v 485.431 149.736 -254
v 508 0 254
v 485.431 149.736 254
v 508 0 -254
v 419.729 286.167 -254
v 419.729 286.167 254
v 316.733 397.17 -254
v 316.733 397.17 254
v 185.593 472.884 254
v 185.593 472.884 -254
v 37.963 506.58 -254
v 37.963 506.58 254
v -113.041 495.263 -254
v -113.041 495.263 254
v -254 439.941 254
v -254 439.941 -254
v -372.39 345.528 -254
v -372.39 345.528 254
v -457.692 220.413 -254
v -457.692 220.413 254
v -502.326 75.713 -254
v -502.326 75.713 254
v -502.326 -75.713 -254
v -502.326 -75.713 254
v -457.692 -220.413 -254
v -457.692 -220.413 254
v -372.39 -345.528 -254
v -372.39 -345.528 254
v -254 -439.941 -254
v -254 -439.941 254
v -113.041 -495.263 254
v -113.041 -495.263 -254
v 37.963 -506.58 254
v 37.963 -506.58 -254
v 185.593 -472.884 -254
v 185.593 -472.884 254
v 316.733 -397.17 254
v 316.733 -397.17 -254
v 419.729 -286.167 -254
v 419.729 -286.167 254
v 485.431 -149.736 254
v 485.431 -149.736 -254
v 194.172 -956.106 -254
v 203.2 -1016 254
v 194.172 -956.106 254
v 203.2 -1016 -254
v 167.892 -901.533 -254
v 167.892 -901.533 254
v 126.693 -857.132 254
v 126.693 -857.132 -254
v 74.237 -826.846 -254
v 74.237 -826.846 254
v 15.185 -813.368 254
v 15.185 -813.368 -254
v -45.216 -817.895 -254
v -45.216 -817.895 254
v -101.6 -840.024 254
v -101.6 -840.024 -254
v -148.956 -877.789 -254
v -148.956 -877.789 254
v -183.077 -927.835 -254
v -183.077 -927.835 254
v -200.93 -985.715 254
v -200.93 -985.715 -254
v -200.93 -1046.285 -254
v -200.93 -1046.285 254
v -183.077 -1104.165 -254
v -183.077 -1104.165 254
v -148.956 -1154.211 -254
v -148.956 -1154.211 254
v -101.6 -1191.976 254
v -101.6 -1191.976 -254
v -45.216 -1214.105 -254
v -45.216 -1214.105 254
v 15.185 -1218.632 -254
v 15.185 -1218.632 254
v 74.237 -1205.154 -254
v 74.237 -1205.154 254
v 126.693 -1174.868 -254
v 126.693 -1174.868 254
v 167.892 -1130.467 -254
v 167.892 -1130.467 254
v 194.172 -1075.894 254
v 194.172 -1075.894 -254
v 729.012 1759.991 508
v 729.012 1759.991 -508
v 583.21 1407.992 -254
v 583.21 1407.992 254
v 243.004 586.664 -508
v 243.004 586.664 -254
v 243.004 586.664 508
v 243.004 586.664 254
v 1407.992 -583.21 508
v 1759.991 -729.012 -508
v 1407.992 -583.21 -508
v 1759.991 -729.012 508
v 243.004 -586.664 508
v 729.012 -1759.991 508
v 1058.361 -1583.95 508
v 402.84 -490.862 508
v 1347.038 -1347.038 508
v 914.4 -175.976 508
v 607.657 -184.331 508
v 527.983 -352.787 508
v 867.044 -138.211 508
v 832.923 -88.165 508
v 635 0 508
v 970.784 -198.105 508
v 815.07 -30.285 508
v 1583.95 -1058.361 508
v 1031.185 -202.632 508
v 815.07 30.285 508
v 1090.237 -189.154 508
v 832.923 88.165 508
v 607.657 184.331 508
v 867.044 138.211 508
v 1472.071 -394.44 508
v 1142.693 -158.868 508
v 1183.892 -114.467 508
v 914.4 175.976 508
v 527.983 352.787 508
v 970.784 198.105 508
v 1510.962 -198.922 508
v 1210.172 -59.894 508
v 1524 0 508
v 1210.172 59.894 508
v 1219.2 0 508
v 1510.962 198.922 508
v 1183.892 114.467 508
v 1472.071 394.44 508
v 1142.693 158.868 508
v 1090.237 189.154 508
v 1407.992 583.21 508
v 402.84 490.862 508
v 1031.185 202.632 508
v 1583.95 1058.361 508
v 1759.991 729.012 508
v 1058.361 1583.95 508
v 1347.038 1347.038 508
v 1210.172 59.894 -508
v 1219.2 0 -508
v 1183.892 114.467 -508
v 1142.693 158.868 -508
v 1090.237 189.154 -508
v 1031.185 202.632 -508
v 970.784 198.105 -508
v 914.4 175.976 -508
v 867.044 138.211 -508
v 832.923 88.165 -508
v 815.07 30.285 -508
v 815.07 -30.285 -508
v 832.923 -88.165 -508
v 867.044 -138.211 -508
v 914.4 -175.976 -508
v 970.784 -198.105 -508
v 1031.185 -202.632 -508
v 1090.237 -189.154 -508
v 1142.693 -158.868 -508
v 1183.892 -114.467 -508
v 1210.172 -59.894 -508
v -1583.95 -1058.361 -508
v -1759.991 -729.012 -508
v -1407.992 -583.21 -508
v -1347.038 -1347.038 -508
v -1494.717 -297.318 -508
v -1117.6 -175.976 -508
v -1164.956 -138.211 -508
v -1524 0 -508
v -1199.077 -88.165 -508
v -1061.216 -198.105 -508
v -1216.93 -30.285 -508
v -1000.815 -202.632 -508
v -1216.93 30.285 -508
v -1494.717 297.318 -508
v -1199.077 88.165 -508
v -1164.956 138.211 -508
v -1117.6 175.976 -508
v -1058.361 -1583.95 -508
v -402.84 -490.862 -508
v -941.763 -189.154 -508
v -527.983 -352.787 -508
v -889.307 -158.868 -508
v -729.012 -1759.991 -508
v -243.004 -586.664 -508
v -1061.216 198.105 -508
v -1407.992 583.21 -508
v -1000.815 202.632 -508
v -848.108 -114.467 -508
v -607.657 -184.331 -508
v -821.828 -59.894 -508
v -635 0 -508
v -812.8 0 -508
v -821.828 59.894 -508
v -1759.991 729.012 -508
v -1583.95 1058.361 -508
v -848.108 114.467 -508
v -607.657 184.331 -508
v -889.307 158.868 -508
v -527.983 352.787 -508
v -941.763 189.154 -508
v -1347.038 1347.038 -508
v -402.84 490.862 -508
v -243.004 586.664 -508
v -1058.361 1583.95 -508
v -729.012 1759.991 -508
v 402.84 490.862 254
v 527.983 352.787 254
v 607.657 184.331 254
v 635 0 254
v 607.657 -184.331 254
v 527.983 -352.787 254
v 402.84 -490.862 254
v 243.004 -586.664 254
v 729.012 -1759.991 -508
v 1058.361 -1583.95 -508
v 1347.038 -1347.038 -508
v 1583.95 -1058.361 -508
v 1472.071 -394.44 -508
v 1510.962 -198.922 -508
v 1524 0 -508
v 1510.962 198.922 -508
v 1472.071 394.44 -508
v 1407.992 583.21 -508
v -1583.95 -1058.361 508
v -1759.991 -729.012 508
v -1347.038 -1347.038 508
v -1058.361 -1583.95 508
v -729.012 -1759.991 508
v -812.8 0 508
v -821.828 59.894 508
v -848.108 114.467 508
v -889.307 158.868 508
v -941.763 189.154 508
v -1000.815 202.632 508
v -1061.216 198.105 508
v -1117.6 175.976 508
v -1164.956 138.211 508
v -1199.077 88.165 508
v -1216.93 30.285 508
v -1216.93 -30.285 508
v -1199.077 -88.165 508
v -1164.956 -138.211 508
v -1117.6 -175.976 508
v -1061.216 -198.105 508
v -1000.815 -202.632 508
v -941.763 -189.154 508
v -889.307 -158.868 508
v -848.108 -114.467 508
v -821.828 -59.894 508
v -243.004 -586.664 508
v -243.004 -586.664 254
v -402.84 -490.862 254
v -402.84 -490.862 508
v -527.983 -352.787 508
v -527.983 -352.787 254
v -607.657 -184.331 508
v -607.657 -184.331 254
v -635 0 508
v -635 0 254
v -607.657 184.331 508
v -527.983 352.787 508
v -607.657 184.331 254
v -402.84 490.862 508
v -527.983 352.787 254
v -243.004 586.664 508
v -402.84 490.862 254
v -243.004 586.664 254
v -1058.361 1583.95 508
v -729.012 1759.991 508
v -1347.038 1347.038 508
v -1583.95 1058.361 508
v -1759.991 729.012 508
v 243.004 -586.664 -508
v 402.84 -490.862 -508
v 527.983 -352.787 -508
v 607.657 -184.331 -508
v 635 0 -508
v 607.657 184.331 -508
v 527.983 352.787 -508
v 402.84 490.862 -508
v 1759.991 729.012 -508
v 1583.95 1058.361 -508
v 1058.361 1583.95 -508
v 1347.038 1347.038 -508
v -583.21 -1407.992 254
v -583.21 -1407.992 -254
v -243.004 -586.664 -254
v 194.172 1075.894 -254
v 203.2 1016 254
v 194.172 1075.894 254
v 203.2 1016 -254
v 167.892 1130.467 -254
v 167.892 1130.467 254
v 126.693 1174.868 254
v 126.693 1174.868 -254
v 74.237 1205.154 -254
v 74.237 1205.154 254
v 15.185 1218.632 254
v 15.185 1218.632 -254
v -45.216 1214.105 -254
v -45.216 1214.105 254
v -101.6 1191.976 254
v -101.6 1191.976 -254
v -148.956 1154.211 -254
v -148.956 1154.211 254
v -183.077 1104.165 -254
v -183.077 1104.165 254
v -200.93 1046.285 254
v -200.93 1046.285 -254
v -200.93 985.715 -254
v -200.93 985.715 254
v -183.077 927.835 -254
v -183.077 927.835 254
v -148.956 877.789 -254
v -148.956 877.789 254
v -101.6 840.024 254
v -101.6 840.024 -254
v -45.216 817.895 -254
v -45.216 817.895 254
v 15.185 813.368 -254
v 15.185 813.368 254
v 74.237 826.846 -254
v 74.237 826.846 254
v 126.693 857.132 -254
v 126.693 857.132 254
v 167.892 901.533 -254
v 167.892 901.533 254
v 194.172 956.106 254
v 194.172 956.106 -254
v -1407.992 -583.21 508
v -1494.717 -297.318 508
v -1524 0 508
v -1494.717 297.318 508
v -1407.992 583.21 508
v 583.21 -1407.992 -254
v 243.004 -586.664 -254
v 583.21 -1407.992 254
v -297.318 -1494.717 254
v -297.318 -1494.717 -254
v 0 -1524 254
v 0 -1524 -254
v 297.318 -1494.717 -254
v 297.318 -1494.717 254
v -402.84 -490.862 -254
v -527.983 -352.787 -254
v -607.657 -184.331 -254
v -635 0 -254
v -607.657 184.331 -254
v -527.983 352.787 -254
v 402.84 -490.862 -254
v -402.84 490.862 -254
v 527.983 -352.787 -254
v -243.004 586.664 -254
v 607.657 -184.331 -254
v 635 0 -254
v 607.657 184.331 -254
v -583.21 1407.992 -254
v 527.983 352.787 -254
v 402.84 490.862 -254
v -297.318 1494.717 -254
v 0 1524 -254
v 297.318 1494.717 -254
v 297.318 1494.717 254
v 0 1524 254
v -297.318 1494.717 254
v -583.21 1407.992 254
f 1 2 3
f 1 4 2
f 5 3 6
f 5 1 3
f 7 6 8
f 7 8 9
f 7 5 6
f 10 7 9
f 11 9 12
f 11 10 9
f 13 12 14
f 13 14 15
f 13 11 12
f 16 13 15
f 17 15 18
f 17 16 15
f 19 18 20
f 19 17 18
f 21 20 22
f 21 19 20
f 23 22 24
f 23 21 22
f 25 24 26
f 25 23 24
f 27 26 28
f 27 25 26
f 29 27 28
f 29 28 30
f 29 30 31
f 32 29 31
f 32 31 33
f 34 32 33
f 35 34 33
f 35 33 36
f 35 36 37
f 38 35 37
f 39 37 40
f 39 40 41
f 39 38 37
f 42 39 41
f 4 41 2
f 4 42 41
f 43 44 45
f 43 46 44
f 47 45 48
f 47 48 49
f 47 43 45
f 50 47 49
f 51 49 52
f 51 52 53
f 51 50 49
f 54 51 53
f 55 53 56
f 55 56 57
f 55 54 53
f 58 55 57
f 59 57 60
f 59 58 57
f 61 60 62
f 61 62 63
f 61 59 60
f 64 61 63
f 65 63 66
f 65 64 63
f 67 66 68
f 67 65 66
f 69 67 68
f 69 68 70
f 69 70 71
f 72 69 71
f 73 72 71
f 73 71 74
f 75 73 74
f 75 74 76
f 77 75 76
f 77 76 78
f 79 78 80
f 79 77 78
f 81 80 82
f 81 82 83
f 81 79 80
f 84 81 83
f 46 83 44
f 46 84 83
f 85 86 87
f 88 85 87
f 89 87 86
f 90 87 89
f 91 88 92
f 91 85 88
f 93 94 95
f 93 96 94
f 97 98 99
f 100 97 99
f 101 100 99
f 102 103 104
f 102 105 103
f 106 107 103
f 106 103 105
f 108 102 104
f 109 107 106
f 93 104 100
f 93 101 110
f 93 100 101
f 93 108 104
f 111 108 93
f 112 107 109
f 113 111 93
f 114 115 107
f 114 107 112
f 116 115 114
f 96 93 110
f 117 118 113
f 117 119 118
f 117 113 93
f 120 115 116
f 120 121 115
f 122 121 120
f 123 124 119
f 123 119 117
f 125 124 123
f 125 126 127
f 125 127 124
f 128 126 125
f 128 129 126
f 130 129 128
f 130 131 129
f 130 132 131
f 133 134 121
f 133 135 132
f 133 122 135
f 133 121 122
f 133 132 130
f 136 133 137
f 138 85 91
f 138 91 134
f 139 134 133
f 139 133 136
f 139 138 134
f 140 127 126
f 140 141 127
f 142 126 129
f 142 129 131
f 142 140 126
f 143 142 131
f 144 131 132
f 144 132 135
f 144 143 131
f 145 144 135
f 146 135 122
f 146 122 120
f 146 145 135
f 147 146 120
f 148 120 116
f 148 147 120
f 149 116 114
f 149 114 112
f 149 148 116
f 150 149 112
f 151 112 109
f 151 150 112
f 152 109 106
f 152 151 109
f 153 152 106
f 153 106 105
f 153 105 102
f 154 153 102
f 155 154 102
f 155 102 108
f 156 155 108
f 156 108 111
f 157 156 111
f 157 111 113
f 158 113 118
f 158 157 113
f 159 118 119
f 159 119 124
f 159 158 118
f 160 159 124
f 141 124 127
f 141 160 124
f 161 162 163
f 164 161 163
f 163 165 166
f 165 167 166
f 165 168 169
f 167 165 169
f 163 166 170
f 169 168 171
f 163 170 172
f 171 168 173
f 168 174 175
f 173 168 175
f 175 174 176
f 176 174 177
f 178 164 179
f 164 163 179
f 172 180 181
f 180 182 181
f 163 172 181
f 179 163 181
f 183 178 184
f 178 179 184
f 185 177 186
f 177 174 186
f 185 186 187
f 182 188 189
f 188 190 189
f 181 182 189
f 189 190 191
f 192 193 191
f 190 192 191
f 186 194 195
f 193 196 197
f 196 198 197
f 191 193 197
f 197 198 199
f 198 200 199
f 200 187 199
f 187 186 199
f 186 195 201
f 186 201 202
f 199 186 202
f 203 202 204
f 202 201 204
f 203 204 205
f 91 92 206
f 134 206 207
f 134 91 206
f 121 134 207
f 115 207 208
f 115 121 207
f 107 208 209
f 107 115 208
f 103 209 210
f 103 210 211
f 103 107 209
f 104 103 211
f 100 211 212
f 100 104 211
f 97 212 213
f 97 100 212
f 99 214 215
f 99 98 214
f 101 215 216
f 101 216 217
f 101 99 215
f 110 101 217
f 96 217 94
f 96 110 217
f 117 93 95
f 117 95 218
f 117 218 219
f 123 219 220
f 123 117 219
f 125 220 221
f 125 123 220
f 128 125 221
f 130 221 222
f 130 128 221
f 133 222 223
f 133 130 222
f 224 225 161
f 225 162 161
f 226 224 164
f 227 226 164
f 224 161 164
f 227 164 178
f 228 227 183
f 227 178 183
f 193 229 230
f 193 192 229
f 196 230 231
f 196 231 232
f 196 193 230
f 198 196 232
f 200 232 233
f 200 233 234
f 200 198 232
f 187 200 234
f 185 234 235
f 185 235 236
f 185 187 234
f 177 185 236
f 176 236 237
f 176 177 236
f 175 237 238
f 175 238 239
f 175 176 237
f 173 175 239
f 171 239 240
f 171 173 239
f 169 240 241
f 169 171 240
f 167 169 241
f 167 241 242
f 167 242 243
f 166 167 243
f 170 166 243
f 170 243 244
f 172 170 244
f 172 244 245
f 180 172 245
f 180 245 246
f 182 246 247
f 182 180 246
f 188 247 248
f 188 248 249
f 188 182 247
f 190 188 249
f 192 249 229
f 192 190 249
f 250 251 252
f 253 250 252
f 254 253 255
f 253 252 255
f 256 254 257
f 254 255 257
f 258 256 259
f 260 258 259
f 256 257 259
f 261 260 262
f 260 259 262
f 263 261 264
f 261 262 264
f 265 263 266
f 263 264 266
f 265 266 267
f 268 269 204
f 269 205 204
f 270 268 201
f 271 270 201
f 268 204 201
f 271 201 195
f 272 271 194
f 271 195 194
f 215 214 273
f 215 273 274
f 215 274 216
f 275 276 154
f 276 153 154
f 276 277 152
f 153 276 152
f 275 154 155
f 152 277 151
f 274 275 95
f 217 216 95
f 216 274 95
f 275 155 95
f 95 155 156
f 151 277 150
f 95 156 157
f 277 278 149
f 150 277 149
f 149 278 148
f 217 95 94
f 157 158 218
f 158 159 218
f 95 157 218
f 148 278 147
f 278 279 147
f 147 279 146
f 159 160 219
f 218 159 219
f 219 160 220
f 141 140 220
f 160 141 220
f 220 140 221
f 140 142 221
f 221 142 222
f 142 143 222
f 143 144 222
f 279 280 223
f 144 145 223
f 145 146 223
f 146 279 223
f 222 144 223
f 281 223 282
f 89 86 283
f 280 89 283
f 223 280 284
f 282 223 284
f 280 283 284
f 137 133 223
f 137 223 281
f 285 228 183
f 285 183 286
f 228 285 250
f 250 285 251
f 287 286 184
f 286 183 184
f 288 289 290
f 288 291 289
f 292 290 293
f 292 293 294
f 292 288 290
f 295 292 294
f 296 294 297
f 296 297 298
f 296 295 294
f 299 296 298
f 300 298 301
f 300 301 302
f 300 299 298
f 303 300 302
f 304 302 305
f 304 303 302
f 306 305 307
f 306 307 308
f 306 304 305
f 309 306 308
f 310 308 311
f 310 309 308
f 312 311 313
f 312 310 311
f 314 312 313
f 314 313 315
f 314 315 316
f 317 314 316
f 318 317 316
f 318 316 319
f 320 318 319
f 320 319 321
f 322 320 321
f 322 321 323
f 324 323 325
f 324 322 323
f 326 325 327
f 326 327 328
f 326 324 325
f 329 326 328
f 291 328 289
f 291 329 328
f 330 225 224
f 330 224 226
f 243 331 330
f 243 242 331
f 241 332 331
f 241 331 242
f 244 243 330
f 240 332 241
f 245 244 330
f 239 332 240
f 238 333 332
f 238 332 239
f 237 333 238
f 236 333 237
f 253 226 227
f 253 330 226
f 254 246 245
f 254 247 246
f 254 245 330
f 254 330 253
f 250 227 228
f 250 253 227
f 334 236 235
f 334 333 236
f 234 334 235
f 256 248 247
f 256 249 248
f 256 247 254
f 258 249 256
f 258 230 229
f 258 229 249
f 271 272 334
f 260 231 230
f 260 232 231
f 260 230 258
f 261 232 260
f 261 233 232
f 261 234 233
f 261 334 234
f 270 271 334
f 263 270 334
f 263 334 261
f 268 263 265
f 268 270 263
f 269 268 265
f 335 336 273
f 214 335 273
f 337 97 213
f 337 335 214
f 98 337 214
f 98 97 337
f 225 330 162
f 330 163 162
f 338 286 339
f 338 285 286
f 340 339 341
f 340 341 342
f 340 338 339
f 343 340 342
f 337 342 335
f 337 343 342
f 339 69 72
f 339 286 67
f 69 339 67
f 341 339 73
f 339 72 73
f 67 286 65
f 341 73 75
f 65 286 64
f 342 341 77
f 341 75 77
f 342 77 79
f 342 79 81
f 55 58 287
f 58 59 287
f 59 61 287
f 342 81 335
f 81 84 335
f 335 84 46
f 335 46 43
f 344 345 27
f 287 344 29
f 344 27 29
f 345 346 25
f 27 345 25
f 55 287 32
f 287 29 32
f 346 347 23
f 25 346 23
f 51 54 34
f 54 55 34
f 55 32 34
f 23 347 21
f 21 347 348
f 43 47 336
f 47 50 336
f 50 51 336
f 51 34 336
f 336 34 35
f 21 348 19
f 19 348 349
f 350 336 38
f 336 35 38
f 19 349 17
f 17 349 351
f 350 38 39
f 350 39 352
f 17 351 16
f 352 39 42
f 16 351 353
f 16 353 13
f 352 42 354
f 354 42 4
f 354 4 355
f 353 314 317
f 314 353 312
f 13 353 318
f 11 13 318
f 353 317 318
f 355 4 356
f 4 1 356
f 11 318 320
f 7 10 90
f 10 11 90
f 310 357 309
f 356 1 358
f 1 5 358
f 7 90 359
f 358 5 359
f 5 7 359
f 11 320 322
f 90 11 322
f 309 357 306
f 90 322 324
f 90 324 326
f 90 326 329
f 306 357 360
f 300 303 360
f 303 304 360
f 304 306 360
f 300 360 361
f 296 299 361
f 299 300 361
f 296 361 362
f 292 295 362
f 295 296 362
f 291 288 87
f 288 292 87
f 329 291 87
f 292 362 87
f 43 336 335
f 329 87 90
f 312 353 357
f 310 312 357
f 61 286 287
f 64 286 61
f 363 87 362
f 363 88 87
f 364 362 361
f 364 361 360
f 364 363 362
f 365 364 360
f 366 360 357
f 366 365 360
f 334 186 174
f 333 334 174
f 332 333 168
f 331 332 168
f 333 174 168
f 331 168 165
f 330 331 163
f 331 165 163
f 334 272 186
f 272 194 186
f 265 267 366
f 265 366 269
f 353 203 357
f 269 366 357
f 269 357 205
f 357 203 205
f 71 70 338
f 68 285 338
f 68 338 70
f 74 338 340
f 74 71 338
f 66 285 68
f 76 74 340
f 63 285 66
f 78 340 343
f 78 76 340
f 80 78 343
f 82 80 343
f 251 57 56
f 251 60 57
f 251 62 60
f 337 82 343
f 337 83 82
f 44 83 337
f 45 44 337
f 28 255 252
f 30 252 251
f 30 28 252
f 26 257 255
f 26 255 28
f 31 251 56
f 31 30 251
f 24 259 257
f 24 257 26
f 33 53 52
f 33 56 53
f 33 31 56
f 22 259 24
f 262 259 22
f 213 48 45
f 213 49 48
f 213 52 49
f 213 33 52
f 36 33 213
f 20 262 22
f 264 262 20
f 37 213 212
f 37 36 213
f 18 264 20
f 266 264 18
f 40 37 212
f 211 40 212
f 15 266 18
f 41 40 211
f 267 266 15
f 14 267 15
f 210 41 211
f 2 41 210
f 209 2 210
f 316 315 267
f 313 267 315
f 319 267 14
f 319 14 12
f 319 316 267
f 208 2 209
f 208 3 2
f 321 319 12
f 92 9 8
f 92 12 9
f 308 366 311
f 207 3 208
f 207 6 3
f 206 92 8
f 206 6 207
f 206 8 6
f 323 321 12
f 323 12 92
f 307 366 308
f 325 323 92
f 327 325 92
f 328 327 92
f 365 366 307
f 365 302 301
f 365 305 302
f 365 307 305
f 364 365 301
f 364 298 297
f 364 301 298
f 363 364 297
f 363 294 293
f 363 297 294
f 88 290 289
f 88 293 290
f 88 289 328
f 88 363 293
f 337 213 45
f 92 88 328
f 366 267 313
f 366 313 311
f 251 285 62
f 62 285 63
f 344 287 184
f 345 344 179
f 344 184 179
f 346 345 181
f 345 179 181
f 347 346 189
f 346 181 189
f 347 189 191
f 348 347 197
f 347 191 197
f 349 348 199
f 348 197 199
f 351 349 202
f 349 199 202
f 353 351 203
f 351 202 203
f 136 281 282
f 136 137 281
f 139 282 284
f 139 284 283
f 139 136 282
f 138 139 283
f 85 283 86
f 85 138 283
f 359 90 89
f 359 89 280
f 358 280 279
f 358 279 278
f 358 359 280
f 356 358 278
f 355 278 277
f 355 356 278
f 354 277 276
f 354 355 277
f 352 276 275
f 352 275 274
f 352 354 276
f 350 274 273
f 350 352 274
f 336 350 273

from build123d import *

# Parameters (mm, degrees)
SKETCH1_R             = 203.2
BOSS_EXTRUDE1_DEPTH   = 508
BOSS_EXTRUDE1_2_DEPTH = 508
SKETCH1_3_R           = 203.2
SKETCH1_3_R_2         = 508
BOSS_EXTRUDE2_DEPTH   = 254


with BuildPart() as part:
    # Sketch1 → Boss-Extrude1 (new, symmetric)
    with BuildSketch(Plane.XY):
        with BuildLine():
            Line((729.011938655, 1759.990509434), (243.003979552, 586.663503145))
            ThreePointArc((243.003979552, 586.663503145), (635, 0), (243.003979552, -586.663503145))
            Line((243.003979552, -586.663503145), (729.011938655, -1759.990509434))
            ThreePointArc((729.011938655, -1759.990509434), (1347.03841816, -1347.03841816), (1759.990509434, -729.011938655))
            Line((1759.990509434, -729.011938655), (1407.992407547, -583.209550924))
            ThreePointArc((1407.992407547, -583.209550924), (1524, 0), (1407.992407547, 583.209550924))
            Line((1407.992407547, 583.209550924), (1759.990509434, 729.011938655))
            ThreePointArc((1759.990509434, 729.011938655), (1347.03841816, 1347.03841816), (729.011938655, 1759.990509434))
        make_face()
        with Locations((1016, 0)):
            Circle(SKETCH1_R, mode=Mode.SUBTRACT)
    extrude(amount=BOSS_EXTRUDE1_DEPTH, both=True)



with BuildPart() as body_2:
    # Sketch1 → Boss-Extrude1 2 (new, symmetric)
    with BuildSketch(Plane.XY):
        with BuildLine():
            Line((-1759.990509434, 729.011938655), (-1407.992407547, 583.209550924))
            ThreePointArc((-1407.992407547, 583.209550924), (-1524, 0), (-1407.992407547, -583.209550924))
            Line((-1407.992407547, -583.209550924), (-1759.990509434, -729.011938655))
            ThreePointArc((-1759.990509434, -729.011938655), (-1347.03841816, -1347.03841816), (-729.011938655, -1759.990509434))
            Line((-729.011938655, -1759.990509434), (-243.003979552, -586.663503145))
            ThreePointArc((-243.003979552, -586.663503145), (-635, 0), (-243.003979552, 586.663503145))
            Line((-243.003979552, 586.663503145), (-729.011938655, 1759.990509434))
            ThreePointArc((-729.011938655, 1759.990509434), (-1347.03841816, 1347.03841816), (-1759.990509434, 729.011938655))
        make_face()
        with Locations((-1016, 0)):
            Circle(SKETCH1_R, mode=Mode.SUBTRACT)
    extrude(amount=BOSS_EXTRUDE1_2_DEPTH, both=True)


with BuildPart() as part_1:
    add(part.part)

    add(body_2.part)  # Boss-Extrude2 merges body 2
    # Sketch1<3> → Boss-Extrude2 (add, symmetric)
    with BuildSketch(Plane.XY):
        with BuildLine():
            Line((243.003979552, 586.663503145), (583.209550924, 1407.992407547))
            ThreePointArc((583.209550924, 1407.992407547), (0, 1524), (-583.209550924, 1407.992407547))
            Line((-583.209550924, 1407.992407547), (-243.003979552, 586.663503145))
            ThreePointArc((-243.003979552, 586.663503145), (-635, 0), (-243.003979552, -586.663503145))
            Line((-243.003979552, -586.663503145), (-583.209550924, -1407.992407547))
            ThreePointArc((-583.209550924, -1407.992407547), (0, -1524), (583.209550924, -1407.992407547))
            Line((583.209550924, -1407.992407547), (243.003979552, -586.663503145))
            ThreePointArc((243.003979552, -586.663503145), (635, 0), (243.003979552, 586.663503145))
        make_face()
        with Locations((0, 1016)):
            Circle(SKETCH1_3_R, mode=Mode.SUBTRACT)
        Circle(SKETCH1_3_R_2, mode=Mode.SUBTRACT)
        with Locations((0, -1016)):
            Circle(SKETCH1_3_R, mode=Mode.SUBTRACT)
    extrude(amount=BOSS_EXTRUDE2_DEPTH, both=True)


solid = part_1.part
